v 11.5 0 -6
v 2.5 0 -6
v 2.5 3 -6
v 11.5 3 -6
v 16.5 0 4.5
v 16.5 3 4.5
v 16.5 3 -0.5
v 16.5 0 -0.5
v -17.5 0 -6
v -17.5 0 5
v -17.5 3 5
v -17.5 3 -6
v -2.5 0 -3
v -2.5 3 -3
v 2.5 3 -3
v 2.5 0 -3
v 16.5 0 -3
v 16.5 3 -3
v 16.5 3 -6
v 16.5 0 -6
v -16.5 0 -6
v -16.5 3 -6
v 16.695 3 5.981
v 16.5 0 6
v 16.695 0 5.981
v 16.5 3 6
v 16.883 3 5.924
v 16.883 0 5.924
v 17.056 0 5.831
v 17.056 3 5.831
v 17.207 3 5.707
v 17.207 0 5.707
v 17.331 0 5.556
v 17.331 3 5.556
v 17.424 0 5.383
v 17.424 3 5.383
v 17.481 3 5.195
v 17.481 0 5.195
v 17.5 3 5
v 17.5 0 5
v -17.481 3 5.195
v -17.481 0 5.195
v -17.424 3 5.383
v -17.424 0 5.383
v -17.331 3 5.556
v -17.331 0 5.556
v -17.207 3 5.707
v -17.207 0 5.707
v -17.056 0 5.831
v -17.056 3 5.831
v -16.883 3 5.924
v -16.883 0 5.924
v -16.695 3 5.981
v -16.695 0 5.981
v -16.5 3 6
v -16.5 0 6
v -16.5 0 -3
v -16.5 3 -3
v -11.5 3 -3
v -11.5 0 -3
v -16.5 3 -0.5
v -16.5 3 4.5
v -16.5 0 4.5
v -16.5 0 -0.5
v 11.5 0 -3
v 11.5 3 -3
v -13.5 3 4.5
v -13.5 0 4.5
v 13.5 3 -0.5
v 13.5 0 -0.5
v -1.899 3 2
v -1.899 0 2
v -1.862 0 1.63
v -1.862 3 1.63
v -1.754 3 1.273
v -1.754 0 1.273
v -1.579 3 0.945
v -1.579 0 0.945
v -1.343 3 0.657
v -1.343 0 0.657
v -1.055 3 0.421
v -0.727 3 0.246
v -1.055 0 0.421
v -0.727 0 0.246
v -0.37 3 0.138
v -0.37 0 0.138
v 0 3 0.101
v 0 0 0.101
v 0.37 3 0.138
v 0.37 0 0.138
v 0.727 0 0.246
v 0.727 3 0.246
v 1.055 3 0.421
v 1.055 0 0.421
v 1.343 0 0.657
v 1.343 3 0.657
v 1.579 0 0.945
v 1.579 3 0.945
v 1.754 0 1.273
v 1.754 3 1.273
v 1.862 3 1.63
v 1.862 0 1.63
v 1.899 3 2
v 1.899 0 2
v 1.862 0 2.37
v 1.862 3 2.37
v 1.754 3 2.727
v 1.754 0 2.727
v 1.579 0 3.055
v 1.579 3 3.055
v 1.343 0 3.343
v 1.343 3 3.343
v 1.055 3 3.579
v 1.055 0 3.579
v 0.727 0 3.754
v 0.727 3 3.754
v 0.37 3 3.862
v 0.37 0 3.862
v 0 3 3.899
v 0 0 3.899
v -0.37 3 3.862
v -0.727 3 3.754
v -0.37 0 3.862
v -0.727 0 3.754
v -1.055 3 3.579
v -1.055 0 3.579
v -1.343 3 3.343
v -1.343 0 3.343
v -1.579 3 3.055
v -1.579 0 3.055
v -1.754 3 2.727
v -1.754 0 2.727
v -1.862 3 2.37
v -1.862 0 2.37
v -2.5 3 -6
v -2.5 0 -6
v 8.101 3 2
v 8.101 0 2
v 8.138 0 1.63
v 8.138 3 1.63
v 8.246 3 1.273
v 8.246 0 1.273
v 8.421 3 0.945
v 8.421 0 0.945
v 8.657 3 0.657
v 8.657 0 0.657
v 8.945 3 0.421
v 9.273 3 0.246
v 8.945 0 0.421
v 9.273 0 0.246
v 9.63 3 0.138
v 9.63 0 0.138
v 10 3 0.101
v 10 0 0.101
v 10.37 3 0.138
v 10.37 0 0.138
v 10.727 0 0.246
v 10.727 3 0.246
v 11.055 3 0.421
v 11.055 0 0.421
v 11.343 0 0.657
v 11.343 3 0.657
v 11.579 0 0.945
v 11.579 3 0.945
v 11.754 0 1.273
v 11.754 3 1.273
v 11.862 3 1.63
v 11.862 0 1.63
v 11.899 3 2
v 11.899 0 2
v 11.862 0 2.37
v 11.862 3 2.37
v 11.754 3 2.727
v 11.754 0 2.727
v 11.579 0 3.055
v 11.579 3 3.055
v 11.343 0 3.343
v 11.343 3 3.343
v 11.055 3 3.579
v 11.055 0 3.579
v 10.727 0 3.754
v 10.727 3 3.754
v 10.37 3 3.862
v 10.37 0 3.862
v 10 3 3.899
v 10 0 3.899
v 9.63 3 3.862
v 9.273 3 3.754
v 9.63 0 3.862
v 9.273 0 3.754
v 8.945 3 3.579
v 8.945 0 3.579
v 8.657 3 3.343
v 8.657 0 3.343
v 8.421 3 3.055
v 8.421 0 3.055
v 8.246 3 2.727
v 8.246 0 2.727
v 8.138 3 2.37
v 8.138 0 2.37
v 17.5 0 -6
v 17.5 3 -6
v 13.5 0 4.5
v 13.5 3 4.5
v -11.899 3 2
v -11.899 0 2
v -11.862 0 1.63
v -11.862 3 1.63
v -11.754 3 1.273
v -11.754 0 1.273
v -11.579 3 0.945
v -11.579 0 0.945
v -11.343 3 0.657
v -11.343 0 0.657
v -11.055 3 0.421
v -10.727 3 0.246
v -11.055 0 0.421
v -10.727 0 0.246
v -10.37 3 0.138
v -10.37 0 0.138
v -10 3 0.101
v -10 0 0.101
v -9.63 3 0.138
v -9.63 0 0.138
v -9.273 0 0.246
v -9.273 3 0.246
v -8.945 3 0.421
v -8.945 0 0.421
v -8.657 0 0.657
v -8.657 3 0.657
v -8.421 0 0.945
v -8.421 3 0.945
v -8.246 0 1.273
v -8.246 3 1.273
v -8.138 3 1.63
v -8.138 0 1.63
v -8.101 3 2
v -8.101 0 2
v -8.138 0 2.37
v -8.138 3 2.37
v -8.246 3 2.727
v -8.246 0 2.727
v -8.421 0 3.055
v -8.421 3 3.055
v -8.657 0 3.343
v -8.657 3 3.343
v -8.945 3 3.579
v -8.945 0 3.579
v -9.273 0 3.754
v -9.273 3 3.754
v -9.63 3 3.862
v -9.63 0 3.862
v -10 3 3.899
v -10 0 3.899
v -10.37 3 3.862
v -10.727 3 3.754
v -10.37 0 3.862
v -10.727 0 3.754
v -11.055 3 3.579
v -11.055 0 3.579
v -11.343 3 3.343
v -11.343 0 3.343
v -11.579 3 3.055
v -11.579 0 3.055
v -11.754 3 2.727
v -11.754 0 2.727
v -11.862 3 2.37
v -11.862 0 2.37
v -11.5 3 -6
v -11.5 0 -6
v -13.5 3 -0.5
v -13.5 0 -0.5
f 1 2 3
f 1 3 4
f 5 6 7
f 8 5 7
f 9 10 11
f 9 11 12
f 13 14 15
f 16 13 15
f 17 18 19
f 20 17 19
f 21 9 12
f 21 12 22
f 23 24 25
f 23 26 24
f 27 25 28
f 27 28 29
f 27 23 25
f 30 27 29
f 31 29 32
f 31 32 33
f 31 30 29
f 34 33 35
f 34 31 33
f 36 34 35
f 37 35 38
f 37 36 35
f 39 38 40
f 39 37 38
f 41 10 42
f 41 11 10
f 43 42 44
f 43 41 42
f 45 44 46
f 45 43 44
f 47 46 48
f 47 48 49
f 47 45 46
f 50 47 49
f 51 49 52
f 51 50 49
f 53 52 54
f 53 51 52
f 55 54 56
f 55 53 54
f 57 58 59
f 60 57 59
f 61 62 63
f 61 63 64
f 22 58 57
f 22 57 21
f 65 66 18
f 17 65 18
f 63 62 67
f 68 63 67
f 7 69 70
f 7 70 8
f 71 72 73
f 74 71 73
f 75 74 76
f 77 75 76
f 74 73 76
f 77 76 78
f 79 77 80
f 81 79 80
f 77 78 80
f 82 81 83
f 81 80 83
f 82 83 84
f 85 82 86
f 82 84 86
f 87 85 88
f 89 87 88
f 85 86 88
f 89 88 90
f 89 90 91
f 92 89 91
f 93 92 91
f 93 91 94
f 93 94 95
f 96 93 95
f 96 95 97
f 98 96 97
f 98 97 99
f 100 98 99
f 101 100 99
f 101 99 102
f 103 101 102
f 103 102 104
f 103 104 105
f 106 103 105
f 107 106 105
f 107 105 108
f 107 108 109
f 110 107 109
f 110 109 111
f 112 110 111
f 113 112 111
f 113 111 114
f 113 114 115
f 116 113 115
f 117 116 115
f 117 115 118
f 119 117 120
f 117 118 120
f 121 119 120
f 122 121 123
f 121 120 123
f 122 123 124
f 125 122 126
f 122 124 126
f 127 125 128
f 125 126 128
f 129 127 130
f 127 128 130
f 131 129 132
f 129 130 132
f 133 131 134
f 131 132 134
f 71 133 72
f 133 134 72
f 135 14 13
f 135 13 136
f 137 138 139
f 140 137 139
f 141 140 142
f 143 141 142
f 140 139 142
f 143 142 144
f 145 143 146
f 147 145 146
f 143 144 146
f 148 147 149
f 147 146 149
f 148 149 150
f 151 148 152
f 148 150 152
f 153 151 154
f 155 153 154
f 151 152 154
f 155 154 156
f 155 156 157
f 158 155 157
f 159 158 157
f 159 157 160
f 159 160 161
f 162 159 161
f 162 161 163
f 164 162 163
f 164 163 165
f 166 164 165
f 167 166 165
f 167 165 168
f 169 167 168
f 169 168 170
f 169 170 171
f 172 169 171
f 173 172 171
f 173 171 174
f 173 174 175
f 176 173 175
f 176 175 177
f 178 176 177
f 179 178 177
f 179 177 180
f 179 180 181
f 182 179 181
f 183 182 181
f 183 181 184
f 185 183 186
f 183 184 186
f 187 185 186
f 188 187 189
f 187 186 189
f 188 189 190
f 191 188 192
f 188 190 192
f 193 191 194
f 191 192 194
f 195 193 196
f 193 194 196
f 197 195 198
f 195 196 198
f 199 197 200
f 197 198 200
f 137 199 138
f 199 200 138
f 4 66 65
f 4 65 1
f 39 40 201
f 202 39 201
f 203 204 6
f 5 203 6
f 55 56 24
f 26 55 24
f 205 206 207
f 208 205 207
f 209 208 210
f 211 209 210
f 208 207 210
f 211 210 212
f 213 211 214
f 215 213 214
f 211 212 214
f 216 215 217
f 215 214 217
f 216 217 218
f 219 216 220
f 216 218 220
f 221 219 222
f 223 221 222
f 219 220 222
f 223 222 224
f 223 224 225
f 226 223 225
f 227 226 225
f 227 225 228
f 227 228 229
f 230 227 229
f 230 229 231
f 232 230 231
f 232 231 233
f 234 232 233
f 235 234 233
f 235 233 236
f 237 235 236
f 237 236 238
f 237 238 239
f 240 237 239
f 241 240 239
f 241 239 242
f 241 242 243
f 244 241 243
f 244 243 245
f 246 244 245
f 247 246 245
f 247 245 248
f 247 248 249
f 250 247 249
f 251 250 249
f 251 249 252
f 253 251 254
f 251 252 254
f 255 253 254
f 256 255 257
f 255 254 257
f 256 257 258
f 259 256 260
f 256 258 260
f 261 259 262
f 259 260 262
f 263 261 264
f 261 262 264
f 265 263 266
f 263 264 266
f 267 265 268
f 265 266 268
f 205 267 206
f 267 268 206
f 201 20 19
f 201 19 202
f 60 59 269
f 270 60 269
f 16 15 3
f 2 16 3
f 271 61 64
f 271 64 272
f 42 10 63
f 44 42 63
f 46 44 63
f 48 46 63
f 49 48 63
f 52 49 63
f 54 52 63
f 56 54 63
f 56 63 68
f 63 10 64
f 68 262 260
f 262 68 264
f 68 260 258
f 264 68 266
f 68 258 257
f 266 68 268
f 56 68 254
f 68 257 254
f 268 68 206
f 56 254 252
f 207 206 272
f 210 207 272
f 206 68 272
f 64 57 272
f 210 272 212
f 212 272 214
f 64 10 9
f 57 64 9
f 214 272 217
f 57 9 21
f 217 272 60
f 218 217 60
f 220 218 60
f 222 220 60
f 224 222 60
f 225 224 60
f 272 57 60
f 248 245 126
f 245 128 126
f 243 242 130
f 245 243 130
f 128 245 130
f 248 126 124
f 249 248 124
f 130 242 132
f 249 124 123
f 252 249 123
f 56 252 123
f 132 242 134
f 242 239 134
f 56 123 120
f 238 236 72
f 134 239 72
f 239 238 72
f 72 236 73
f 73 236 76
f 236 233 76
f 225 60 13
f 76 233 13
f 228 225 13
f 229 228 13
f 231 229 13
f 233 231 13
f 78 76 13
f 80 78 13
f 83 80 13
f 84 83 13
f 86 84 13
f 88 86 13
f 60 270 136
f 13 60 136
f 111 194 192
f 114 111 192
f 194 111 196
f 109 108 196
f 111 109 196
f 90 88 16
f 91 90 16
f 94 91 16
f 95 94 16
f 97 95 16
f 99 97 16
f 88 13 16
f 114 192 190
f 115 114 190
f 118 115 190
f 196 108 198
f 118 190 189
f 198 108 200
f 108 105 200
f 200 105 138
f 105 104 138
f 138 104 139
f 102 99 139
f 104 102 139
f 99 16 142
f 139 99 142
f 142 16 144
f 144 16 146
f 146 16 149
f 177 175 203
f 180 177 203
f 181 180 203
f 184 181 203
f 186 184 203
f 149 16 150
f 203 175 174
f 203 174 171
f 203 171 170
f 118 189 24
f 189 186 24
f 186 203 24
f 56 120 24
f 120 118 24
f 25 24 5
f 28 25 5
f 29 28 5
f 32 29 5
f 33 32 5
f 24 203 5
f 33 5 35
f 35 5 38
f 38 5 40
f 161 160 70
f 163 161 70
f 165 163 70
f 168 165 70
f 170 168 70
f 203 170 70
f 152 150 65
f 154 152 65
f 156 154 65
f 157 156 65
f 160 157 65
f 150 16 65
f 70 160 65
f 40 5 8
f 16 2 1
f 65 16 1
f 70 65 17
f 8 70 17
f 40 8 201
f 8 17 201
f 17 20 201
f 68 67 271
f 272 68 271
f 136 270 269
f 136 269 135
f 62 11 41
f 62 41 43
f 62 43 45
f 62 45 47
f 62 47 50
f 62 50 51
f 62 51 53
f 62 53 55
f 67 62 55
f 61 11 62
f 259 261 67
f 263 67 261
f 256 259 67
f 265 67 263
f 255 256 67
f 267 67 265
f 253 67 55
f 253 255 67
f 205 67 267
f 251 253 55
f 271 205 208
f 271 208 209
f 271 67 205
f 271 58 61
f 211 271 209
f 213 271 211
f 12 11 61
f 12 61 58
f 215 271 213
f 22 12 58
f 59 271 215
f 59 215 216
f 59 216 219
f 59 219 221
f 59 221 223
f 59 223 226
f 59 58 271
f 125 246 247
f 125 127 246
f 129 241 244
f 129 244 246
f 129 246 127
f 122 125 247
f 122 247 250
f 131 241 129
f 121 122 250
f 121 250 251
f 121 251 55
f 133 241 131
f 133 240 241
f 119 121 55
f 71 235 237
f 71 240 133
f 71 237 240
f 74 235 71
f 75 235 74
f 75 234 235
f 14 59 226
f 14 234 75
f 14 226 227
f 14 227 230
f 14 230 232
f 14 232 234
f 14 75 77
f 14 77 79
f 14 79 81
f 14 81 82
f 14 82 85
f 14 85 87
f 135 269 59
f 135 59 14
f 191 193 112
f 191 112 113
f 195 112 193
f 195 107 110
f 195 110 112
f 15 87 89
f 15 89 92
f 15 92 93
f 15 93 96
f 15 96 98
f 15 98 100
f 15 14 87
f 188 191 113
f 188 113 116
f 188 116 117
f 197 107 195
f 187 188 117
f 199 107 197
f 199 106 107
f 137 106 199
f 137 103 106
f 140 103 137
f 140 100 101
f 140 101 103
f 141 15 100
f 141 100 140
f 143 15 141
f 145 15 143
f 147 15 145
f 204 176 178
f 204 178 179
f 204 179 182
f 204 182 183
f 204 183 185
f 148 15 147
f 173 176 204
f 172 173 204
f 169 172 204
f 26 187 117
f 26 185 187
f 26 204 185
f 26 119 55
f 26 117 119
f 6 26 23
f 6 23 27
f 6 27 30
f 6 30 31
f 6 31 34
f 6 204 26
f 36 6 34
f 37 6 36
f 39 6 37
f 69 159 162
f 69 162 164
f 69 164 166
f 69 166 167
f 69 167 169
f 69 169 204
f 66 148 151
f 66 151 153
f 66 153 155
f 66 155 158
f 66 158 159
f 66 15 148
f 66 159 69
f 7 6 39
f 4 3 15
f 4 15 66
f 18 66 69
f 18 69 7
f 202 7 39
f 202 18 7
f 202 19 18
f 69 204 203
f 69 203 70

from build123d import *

# Parameters (mm, degrees)
SKETCH1_W             = 35
SKETCH1_H             = 12
BOSS_EXTRUDE1_DEPTH   = 3
SKETCH5_W             = 3
SKETCH5_H             = 5
SKETCH5_W_2           = 5
SKETCH5_H_2           = 3
CUT_EXTRUDE1_DEPTH    = 3
FILLET1_R             = 1
F_6_CLEARANCE_HOLE2_D = 3.7973


with BuildPart() as part:
    # Sketch1 → Boss-Extrude1 (new body)
    with BuildSketch(Plane(origin=(0, 0, 0), x_dir=(1, 0, 0), z_dir=(0, 1, 0))):
        Rectangle(SKETCH1_W, SKETCH1_H)
    extrude(amount=BOSS_EXTRUDE1_DEPTH)

    # Sketch5 → Cut-Extrude1 (cut)
    with BuildSketch(Plane(origin=(0, 3, 0), x_dir=(1, 0, 0), z_dir=(0, 1, 0))):
        with Locations((-15, -2)):
            Rectangle(SKETCH5_W, SKETCH5_H)
        with Locations((15, -2)):
            Rectangle(SKETCH5_W, SKETCH5_H)
        with Locations((-14, 4.5)):
            Rectangle(SKETCH5_W_2, SKETCH5_H_2)
        with Locations((0, 4.5)):
            Rectangle(SKETCH5_W_2, SKETCH5_H_2)
        with Locations((14, 4.5)):
            Rectangle(SKETCH5_W_2, SKETCH5_H_2)
    extrude(amount=-CUT_EXTRUDE1_DEPTH, mode=Mode.SUBTRACT)

    # Fillet1
    fillet1_edges = [part.edges().sort_by_distance(p)[0] for p in [
        (-17.5, 1.5, 6),
        (17.5, 1.5, 6),
    ]]
    fillet(fillet1_edges, radius=FILLET1_R)

    # #6 Clearance Hole2 (through all)
    with Locations(Plane(origin=(0, 3, 0), x_dir=(1, 0, 0), z_dir=(0, 1, 0))):
        with Locations((-10, -2), (0, -2), (10, -2)):
            Hole(F_6_CLEARANCE_HOLE2_D / 2)


solid = part.part
